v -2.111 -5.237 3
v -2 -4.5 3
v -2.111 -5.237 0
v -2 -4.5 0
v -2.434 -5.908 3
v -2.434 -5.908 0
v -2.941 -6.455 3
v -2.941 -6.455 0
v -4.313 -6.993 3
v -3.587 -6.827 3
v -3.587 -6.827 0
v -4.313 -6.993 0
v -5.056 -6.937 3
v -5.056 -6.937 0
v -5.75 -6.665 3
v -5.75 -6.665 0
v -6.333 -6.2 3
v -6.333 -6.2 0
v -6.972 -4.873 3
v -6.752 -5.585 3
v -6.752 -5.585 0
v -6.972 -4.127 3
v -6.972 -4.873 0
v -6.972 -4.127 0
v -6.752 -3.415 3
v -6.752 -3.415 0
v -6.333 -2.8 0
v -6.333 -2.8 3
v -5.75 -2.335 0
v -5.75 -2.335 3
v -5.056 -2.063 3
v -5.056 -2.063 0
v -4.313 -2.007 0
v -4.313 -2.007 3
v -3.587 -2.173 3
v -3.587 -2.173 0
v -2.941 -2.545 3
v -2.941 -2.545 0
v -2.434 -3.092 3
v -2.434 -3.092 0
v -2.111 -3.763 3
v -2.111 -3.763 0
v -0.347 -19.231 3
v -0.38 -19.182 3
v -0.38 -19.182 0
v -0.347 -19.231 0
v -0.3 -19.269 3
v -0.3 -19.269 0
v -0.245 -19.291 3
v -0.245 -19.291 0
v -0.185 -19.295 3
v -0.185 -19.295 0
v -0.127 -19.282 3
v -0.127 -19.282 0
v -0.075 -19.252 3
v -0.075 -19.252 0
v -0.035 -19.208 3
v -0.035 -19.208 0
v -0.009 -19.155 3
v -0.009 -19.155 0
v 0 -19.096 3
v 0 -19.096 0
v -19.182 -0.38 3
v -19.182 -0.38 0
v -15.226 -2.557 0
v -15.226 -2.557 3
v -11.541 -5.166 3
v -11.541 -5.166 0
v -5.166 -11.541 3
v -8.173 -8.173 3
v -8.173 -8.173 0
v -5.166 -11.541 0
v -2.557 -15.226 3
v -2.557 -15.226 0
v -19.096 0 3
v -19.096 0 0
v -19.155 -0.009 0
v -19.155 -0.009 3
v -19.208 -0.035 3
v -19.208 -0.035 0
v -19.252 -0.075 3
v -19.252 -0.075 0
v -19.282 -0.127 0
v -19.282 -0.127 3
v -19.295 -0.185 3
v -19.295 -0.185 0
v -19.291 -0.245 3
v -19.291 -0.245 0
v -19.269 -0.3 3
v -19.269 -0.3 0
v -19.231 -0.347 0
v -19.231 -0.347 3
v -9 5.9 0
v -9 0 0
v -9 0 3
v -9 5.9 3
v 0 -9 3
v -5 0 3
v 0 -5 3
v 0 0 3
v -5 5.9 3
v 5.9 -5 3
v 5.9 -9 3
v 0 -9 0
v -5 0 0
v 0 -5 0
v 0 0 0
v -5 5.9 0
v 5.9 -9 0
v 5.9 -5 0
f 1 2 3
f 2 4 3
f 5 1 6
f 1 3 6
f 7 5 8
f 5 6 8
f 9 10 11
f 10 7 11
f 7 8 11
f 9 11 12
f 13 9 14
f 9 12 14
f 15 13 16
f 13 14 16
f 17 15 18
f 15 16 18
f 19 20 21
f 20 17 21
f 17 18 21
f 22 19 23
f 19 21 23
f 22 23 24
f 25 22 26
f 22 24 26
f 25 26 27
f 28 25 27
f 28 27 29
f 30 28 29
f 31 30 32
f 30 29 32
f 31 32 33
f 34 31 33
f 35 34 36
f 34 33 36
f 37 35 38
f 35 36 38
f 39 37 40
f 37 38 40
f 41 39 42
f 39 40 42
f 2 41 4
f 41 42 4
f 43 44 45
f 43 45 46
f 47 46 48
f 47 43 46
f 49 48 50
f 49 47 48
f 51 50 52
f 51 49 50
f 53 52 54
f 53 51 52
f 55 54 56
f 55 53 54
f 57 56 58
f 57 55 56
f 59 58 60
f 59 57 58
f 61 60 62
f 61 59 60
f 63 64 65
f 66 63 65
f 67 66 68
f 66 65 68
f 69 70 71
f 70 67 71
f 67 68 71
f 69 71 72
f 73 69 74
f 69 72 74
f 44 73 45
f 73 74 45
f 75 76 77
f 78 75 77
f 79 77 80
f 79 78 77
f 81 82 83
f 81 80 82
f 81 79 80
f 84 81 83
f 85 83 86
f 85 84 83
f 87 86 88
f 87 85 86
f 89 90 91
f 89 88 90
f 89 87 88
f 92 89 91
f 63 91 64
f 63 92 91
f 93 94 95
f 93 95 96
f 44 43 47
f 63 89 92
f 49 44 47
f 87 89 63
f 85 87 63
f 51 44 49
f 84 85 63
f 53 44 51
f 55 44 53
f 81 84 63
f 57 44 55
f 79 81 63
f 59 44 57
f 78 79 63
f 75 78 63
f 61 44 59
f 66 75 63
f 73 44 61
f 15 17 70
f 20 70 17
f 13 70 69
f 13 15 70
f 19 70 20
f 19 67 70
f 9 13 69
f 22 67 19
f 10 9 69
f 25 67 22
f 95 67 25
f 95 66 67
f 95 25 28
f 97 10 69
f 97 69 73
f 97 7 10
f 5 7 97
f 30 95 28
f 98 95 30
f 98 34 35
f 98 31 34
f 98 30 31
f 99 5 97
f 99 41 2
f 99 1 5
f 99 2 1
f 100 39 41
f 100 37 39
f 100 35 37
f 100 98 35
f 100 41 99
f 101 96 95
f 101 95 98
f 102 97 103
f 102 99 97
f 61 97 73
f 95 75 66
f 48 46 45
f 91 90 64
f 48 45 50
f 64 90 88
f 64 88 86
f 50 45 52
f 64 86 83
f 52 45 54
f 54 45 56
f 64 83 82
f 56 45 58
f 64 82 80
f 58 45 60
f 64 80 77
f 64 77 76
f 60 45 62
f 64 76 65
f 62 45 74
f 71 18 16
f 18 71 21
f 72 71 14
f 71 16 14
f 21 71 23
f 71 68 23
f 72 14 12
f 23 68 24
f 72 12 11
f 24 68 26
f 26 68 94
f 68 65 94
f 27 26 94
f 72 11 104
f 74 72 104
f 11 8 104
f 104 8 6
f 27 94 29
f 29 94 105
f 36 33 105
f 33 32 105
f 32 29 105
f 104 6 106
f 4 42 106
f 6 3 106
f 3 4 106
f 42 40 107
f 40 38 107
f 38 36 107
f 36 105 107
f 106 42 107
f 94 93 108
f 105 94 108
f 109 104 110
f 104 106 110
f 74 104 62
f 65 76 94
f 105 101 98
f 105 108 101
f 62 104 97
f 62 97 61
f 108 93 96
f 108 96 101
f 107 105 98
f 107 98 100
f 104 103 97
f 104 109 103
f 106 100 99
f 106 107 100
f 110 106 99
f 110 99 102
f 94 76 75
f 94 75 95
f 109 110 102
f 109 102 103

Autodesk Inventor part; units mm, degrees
ref_plane "YZ Plane" through (0, 0, 0) normal (1, 0, 0) x (0, 1, 0)
ref_plane "XZ Plane" through (0, 0, 0) normal (0, 1, 0) x (-1, 0, 0)
ref_plane "XY Plane" through (0, 0, 0) normal (0, 0, 1) x (1, 0, 0)
sketch "Sketch1" plane through (0, 0, 0) normal (0, 0, 1) x (1, 0, 0)
  arc A0 (0, -20) -> (-20, 0) centre (-36.4575, -36.4575) ccw
  circle A1 centre (-4.5, -4.5) radius 2.5
  line L0 (-20, 0) -> (-9, 0)
  line L1 (-9, 0) -> (-9, 5.9)
  line L2 (-9, 5.9) -> (-5, 5.9)
  line L3 (-5, 5.9) -> (-5, 0)
  line L4 (-5, 0) -> (0, 0)
  line L5 (0, 0) -> (0, -5)
  line L6 (0, -5) -> (5.9, -5)
  line L7 (5.9, -5) -> (5.9, -9)
  line L8 (5.9, -9) -> (0, -9)
  line L9 (0, -9) -> (0, -20)
  dimension "d0" = 20
  dimension "d1" = 20
  dimension "d2" = 40
  dimension "d5" = 5
  dimension "d9" = 4
  dimension "d10" = 5.9
  dimension "d12" = 4.5
  dimension "d13" = 5.9
  dimension "d14" = 4
  dimension "d17" = 5
  dimension "d18" = 4.5
  dimension "d19" = 5
extrude "Extrusion1" add sketch "Sketch1" along normal blind 3
fillet "Fillet1" radius 0.2 2 edges at (0, -20, 1.5) (-20, 0, 1.5)
properties part number "Gripper V 8.0 servo support bracket"
